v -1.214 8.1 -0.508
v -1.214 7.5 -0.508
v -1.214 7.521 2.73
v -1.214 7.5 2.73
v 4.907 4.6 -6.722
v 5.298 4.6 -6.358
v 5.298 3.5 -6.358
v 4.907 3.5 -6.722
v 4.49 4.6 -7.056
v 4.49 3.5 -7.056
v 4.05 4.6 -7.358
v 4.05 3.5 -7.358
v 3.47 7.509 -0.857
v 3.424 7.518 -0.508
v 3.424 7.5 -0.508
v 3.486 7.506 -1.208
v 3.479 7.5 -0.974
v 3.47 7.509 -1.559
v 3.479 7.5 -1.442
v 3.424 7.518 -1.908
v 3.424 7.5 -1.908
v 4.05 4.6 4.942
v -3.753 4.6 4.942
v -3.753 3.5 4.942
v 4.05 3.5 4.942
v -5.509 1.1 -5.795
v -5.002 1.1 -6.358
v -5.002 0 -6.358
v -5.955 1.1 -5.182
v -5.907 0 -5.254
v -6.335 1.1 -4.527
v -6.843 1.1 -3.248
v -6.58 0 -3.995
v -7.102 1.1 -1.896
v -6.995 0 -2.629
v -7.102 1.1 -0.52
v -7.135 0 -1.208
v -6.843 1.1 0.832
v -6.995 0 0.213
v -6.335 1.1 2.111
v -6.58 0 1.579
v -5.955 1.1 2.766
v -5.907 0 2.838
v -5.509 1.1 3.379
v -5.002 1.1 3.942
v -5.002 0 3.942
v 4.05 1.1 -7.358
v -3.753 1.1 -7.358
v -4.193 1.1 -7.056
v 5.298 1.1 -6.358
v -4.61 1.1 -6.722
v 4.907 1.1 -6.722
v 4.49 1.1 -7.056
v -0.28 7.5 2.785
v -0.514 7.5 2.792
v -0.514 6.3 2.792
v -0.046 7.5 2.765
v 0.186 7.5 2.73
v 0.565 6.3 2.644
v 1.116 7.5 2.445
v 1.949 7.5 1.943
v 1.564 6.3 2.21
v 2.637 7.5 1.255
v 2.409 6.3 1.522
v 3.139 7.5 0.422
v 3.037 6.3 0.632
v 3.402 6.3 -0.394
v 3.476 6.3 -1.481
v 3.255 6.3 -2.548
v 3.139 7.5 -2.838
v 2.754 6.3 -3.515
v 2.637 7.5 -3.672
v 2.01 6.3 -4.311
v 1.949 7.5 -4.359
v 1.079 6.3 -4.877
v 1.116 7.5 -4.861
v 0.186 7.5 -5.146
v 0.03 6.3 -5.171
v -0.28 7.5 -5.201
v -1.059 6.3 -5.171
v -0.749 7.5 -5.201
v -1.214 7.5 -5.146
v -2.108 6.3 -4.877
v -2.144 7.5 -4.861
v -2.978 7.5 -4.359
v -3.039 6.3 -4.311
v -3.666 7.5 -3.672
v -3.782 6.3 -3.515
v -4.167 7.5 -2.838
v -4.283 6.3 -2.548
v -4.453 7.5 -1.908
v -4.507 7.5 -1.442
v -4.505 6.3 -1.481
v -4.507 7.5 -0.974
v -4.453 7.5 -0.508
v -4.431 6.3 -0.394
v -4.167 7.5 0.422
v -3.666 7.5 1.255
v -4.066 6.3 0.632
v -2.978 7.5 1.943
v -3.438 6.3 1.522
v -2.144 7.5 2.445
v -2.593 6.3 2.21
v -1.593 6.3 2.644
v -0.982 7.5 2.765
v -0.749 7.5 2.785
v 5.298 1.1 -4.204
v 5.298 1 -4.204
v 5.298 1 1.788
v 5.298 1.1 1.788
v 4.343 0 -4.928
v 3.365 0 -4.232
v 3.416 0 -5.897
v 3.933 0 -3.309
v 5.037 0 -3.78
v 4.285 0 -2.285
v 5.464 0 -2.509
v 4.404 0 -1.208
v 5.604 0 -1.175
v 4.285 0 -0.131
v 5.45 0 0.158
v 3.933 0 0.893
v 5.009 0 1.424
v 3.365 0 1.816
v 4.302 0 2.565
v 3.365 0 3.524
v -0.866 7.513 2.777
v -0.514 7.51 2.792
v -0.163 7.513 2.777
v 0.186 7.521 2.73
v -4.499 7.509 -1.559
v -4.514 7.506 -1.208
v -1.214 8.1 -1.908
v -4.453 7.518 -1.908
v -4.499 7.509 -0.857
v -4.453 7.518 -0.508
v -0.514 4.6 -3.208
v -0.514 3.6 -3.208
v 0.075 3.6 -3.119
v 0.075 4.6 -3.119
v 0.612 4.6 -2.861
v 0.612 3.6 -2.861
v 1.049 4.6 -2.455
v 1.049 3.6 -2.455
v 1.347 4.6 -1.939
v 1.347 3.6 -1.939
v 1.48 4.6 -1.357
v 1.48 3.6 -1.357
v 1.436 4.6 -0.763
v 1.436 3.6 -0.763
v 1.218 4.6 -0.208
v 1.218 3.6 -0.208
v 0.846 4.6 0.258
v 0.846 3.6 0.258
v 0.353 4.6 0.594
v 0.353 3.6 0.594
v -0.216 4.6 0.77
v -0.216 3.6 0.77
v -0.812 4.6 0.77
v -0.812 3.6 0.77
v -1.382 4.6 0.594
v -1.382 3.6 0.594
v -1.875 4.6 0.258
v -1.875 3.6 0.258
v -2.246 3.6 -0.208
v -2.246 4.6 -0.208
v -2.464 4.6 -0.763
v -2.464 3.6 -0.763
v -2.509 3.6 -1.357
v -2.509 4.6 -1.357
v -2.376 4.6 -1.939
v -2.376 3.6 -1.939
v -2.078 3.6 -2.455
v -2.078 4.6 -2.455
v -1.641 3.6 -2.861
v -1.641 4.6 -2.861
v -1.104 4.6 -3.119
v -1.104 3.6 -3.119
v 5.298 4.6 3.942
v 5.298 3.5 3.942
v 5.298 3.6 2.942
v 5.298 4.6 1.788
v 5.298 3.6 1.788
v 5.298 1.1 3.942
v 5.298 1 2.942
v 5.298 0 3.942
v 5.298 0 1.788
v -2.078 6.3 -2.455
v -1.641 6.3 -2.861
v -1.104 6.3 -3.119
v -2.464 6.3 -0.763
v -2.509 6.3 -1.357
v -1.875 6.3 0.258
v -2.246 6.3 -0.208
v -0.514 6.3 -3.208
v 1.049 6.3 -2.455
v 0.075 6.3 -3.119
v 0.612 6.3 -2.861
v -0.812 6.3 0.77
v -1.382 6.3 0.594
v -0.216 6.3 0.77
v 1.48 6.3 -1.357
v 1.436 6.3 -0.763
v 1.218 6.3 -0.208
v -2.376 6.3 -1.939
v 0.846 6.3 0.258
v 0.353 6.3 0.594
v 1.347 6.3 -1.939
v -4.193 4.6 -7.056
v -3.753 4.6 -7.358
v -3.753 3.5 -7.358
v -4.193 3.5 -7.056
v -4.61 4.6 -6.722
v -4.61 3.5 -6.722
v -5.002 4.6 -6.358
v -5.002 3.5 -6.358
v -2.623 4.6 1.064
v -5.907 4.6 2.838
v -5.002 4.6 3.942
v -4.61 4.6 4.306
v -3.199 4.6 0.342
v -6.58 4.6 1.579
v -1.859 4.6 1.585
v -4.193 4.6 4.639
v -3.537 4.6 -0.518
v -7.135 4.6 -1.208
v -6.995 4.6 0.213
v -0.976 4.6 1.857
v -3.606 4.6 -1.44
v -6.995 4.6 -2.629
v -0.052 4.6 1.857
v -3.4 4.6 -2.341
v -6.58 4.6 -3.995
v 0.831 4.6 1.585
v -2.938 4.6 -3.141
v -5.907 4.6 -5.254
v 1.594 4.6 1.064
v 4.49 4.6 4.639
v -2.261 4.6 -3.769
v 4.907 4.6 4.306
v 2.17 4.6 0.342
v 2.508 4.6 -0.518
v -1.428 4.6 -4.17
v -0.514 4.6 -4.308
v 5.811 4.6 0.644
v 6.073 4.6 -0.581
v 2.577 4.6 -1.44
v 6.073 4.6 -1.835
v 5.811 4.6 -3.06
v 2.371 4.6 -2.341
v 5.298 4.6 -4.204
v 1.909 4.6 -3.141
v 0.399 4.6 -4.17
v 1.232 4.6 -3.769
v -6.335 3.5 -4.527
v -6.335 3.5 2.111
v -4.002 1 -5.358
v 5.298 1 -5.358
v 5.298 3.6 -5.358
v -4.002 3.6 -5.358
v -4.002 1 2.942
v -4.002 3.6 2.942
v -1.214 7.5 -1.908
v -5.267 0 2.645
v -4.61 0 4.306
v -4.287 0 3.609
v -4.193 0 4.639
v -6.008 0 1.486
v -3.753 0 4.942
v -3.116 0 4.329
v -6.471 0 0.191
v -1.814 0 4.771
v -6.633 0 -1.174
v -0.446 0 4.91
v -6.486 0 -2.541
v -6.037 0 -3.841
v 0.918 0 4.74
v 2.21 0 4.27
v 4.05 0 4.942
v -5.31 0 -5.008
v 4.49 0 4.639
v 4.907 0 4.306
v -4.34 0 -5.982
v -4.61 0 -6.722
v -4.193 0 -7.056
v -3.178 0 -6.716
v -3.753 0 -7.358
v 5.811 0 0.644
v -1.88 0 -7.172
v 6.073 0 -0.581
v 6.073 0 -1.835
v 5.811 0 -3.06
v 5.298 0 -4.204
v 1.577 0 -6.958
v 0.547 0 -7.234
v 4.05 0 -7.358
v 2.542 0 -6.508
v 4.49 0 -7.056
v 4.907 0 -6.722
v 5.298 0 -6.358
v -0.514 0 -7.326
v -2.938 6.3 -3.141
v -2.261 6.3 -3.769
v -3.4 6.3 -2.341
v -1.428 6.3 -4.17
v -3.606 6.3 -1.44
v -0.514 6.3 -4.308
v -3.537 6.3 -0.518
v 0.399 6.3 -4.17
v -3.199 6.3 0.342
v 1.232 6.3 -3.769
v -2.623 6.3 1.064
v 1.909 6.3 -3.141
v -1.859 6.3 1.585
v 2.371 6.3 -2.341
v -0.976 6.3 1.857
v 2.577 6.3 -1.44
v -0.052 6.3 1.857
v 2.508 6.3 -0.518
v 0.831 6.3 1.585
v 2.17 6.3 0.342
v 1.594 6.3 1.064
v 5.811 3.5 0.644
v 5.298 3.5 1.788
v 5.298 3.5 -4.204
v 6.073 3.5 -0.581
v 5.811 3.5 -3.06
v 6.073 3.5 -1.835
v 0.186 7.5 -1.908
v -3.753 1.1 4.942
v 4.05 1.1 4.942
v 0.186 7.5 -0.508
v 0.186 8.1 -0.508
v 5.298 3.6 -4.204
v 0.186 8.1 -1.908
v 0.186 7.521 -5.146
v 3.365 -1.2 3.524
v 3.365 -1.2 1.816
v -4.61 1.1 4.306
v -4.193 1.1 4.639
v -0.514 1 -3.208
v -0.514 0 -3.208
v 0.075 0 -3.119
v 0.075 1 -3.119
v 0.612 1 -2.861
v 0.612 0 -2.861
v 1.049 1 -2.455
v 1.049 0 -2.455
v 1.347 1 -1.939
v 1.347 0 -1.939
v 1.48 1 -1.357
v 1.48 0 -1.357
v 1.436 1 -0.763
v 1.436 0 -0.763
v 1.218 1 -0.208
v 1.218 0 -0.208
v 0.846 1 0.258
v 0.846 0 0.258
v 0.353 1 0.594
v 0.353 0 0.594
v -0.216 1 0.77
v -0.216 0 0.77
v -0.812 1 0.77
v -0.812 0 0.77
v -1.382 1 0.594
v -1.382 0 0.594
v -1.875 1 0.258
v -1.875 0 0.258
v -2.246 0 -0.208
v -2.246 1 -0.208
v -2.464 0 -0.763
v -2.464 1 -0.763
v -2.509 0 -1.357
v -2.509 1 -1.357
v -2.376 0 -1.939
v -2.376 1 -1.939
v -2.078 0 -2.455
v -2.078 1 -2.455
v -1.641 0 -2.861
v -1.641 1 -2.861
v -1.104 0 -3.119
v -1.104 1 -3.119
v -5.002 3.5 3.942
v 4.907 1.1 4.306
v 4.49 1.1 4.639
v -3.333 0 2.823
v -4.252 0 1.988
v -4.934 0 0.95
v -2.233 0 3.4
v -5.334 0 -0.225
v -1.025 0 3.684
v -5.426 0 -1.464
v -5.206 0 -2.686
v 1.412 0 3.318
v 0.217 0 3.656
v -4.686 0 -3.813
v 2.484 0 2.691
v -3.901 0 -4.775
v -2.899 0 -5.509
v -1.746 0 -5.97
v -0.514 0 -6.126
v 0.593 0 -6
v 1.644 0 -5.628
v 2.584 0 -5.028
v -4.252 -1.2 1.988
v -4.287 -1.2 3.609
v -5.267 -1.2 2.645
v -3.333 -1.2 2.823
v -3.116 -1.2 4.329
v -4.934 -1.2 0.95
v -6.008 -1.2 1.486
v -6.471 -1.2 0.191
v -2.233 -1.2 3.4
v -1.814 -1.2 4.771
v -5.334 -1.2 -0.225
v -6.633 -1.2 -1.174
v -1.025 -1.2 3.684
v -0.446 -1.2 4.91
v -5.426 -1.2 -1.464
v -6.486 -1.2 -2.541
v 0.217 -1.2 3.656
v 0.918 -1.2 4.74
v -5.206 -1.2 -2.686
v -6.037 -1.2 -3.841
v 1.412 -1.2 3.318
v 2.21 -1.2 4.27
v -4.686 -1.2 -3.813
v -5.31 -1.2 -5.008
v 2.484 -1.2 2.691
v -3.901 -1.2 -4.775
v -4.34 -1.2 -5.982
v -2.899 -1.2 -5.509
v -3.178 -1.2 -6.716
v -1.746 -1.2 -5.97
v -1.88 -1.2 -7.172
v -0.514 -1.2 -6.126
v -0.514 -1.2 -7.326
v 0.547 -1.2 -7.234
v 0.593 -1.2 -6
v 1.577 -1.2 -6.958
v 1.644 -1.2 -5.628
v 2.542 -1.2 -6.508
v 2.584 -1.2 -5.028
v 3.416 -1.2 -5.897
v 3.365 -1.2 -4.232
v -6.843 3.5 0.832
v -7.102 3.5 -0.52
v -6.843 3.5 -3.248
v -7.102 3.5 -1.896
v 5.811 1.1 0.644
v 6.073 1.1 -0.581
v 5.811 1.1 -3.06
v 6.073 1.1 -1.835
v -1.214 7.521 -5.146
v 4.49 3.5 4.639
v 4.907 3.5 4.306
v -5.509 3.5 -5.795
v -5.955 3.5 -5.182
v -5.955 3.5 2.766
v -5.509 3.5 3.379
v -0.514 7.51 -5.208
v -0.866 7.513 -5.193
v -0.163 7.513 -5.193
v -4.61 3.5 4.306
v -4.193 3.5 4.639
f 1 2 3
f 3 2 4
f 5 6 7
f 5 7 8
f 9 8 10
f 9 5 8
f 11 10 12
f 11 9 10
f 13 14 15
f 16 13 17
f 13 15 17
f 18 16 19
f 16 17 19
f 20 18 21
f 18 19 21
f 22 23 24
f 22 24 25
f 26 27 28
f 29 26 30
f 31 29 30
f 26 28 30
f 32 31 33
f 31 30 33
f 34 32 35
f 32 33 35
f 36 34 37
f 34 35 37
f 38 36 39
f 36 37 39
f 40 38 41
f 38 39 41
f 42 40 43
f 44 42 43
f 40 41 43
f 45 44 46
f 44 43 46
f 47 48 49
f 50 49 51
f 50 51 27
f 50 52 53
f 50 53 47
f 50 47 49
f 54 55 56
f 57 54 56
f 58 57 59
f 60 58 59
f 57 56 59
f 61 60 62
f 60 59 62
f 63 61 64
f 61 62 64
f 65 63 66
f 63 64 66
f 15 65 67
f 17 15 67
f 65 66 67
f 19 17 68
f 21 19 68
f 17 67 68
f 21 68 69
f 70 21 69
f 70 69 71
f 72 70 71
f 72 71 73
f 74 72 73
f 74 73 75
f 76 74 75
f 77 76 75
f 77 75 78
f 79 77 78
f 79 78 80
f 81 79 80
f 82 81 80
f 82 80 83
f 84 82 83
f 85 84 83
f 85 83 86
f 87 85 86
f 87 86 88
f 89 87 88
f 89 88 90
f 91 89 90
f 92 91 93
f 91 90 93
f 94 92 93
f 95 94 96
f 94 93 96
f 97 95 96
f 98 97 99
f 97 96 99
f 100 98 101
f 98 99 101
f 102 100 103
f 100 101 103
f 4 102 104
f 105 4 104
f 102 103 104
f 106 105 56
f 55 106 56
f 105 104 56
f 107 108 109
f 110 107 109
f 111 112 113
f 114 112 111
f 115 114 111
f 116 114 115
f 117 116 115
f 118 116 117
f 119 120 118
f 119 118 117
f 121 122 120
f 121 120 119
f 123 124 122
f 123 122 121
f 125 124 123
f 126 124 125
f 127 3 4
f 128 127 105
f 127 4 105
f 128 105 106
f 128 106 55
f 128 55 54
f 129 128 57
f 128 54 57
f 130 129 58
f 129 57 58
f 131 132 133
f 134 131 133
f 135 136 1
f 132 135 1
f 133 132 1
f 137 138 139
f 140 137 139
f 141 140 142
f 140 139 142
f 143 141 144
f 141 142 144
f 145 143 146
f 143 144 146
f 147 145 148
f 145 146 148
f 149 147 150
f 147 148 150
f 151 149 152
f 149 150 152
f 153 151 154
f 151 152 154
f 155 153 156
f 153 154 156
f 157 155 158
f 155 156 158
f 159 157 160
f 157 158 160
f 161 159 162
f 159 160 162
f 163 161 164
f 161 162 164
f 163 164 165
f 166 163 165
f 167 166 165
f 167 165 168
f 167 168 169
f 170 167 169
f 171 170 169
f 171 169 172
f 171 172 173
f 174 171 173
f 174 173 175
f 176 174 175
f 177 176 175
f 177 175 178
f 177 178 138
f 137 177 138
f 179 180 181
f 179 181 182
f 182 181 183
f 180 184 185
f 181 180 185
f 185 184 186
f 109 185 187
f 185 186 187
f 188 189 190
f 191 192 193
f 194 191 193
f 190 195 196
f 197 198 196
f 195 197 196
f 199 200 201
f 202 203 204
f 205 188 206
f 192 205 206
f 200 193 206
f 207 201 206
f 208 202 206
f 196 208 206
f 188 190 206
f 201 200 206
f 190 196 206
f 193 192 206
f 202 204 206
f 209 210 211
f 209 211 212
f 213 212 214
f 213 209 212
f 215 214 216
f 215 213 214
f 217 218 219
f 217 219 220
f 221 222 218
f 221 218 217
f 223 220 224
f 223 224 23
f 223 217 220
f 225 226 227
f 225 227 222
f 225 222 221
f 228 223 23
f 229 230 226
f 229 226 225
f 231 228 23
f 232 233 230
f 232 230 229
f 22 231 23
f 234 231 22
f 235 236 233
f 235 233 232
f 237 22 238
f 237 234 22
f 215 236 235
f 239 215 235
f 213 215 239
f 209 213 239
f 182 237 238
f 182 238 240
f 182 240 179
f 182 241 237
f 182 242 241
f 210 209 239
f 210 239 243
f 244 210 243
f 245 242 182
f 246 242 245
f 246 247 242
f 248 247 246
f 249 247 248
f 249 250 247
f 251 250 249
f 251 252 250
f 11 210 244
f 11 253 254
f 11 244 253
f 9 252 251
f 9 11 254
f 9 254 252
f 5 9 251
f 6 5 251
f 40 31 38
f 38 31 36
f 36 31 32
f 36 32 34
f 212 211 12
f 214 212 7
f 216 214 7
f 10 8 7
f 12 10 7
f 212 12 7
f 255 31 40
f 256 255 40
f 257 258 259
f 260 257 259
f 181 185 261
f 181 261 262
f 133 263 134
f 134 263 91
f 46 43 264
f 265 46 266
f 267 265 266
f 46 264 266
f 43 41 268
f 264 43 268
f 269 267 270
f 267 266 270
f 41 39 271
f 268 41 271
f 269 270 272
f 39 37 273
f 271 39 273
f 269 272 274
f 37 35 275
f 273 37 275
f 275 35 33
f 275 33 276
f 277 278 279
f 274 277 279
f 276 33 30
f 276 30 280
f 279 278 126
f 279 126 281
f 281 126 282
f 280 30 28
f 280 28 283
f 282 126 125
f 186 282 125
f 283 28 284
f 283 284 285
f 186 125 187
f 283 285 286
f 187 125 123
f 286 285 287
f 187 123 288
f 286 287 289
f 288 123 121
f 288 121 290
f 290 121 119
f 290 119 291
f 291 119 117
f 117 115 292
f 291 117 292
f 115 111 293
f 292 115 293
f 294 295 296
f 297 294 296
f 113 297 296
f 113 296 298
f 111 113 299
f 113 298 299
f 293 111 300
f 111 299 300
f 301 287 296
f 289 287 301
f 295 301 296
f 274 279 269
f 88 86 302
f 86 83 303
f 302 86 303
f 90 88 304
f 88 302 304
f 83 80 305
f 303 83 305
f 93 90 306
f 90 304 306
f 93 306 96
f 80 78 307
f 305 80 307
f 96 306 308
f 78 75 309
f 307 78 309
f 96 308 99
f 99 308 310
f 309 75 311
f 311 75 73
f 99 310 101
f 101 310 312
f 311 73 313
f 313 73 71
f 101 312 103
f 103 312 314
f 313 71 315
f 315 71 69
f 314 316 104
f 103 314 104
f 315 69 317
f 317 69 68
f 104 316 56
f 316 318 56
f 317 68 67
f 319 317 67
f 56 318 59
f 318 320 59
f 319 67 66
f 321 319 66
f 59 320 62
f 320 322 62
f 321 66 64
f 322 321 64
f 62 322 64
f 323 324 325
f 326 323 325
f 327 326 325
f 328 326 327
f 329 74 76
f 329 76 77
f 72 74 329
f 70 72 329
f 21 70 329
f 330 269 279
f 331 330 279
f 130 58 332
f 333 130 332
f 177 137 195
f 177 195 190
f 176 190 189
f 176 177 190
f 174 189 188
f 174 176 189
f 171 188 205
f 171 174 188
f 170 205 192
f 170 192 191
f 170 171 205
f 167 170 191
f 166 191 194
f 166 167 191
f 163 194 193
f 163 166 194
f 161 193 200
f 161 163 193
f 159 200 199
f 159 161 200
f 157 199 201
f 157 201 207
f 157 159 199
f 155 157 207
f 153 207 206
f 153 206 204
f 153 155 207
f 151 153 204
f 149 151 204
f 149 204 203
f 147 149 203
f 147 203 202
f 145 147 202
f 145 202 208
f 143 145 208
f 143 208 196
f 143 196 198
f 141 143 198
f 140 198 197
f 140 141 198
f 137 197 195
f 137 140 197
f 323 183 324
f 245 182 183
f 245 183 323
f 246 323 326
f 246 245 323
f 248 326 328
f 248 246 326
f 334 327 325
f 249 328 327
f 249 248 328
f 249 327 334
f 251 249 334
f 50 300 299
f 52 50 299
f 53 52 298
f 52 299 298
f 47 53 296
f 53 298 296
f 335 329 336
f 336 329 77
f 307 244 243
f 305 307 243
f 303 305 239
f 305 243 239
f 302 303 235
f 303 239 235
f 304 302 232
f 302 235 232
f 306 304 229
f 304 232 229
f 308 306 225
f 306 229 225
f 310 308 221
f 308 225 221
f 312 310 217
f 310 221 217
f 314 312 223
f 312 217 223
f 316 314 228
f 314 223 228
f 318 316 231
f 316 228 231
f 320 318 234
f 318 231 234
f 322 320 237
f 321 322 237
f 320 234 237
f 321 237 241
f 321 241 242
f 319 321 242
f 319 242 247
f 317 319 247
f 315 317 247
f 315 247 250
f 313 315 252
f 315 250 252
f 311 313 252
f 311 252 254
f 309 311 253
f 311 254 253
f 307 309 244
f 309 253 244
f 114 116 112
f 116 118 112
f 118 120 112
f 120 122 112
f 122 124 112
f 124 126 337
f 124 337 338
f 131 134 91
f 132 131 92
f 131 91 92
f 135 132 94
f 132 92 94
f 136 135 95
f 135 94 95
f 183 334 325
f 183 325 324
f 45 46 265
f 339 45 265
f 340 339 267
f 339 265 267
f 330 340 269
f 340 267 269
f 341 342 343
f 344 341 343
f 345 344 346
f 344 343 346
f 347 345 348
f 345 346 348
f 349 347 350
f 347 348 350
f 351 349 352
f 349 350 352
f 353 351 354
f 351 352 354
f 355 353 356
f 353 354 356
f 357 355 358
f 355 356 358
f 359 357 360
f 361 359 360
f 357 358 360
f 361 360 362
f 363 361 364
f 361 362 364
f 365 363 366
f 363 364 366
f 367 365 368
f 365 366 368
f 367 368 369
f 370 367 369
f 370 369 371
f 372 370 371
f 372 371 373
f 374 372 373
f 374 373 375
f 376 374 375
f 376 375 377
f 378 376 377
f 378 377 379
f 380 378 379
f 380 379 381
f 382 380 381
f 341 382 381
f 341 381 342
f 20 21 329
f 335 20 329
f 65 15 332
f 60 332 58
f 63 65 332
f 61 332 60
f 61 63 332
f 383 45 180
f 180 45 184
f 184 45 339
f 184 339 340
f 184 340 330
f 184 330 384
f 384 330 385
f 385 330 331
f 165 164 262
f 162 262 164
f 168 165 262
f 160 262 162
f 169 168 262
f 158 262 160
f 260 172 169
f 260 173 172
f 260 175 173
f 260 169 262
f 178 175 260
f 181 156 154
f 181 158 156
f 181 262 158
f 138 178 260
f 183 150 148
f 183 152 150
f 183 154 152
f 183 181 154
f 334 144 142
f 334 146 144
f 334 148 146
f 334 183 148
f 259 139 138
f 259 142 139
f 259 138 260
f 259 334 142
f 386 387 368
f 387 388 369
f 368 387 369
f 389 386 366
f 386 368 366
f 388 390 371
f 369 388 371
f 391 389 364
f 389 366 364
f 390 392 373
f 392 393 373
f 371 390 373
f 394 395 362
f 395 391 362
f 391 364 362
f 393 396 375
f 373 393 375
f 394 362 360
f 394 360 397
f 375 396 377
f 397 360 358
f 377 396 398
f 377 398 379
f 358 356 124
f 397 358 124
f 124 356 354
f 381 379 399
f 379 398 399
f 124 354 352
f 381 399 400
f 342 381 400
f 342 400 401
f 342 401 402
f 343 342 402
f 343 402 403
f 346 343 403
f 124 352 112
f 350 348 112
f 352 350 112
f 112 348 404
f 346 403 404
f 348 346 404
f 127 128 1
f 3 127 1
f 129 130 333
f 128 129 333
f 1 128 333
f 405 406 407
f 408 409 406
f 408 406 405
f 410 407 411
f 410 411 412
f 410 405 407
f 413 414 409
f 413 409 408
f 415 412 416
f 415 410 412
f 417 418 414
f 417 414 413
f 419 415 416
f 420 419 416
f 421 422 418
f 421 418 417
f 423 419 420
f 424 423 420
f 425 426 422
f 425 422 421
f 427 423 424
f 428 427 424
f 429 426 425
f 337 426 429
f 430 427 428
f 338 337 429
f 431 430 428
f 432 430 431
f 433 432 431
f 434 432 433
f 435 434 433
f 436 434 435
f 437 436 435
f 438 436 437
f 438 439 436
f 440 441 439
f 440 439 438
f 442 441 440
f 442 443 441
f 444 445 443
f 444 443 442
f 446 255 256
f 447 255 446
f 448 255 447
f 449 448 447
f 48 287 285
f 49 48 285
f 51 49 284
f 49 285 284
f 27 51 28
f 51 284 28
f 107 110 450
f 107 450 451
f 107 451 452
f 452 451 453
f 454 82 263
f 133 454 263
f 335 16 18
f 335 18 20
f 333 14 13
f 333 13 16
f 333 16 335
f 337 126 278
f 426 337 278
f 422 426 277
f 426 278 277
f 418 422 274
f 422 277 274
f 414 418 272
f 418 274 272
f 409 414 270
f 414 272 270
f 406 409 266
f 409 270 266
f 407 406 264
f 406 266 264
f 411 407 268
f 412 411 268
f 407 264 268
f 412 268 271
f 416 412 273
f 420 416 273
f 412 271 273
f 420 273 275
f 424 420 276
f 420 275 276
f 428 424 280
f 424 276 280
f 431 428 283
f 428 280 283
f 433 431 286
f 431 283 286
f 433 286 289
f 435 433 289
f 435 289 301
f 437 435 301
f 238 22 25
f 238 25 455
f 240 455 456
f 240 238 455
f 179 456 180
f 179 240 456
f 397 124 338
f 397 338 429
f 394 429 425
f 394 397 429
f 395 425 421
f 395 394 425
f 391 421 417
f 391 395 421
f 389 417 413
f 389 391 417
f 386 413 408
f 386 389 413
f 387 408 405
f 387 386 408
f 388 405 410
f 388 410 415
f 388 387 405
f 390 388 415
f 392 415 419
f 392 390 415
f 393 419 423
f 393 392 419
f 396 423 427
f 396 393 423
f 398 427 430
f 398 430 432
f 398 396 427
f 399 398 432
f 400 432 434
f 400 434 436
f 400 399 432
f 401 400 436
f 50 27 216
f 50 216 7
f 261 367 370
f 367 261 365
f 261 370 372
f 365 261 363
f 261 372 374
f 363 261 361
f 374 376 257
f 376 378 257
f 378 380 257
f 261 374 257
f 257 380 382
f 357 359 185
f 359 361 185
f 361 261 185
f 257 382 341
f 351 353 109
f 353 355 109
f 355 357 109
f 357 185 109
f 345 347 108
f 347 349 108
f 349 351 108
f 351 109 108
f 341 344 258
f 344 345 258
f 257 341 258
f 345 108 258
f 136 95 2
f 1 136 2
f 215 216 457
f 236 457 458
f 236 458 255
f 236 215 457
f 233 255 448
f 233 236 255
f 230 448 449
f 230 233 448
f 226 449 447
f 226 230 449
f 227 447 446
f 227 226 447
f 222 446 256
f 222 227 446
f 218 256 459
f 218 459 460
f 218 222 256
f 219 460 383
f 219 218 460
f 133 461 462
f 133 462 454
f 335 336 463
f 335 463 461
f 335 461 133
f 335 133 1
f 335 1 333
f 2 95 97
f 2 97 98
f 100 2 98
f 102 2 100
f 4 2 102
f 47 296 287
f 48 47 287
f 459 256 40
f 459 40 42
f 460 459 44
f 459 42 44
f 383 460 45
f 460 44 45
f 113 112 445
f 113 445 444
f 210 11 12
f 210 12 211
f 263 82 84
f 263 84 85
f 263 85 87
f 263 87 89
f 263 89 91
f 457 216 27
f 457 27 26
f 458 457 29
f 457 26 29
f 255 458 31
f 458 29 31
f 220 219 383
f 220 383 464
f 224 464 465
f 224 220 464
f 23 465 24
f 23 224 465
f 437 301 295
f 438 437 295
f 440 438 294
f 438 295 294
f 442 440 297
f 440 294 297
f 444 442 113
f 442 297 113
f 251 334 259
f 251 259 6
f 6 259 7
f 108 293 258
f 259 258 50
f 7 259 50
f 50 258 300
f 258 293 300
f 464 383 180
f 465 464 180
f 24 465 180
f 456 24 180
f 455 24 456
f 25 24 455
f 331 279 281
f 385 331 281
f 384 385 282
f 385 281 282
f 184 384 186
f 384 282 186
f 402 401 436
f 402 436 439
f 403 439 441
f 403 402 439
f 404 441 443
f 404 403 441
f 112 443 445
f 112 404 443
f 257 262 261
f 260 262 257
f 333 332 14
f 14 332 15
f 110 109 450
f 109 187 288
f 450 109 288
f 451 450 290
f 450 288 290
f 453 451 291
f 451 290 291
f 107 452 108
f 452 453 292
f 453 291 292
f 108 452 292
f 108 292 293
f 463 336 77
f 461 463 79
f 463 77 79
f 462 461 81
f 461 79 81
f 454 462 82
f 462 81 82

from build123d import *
from build123d.topology import SkipClean

# Parameters (mm, degrees)
SKETCH5_W           = 10.3
SKETCH5_H           = 10.3
BOSS_EXTRUDE2_DEPTH = 4.6
SKETCH6_W           = 8.3
SKETCH6_H           = 2.6
CUT_EXTRUDE3_DEPTH  = 9.3
BOSS_EXTRUDE4_DEPTH = 1.1
BOSS_EXTRUDE5_REACH = 12.83
SKETCH10_R          = 2
CUT_EXTRUDE4_DEPTH  = 12.234169035
SKETCH11_R          = 3.1
SKETCH11_R_2        = 2
BOSS_EXTRUDE6_DEPTH = 1.7
SKETCH12_R          = 4
BOSS_EXTRUDE7_DEPTH = 1.2
BOSS_EXTRUDE8_DEPTH = 0.6
CUT_EXTRUDE7_DEPTH  = 14.165903481
CUT_EXTRUDE8_DEPTH  = 13.784307824
SKETCH16_R          = 6.11839758
SKETCH16_R_2        = 4.91839758
BOSS_EXTRUDE9_DEPTH = 1.2
CUT_EXTRUDE9_START  = -1.2
CUT_EXTRUDE9_DEPTH  = 1.2


with BuildPart() as part:
    # Sketch5 → Boss-Extrude2 (new body)
    with BuildSketch(Plane(origin=(0, 0, 0), x_dir=(1, 0, 0), z_dir=(0, 1, 0))):
        with Locations((0.148353909, 1.208024691)):
            Rectangle(SKETCH5_W, SKETCH5_H)
    extrude(amount=BOSS_EXTRUDE2_DEPTH)

    # Sketch6 → Cut-Extrude3 (cut)
    with BuildSketch(Plane(origin=(5.298353909, 0, 0), x_dir=(0, 0, -1), z_dir=(1, 0, 0))):
        with Locations((1.208024691, 2.3)):
            Rectangle(SKETCH6_W, SKETCH6_H)
    cut_extrude3 = extrude(amount=-CUT_EXTRUDE3_DEPTH, mode=Mode.SUBTRACT)

    # Sketch7 → Boss-Extrude4 (add)
    with BuildSketch(Plane(origin=(0, 4.6, 0), x_dir=(1, 0, 0), z_dir=(0, 1, 0))):
        with BuildLine():
            Line((4.049956144, 7.358024691), (-3.753248326, 7.358024691))
            ThreePointArc((-3.753248326, 7.358024691), (-4.404982862, 6.89240014), (-5.001646091, 6.358024691))
            Line((-5.001646091, 6.358024691), (5.298353909, 6.358024691))
            ThreePointArc((5.298353909, 6.358024691), (4.701690681, 6.89240014), (4.049956144, 7.358024691))
        make_face()
        with BuildLine():
            Line((-5.001646091, -3.941975309), (-5.001646091, 6.358024691))
            ThreePointArc((-5.001646091, 6.358024691), (-7.134845937, 1.208024691), (-5.001646091, -3.941975309))
        make_face()
        with BuildLine():
            Line((5.298353909, -3.941975309), (-5.001646091, -3.941975309))
            ThreePointArc((-5.001646091, -3.941975309), (-4.404982862, -4.476350758), (-3.753248326, -4.941975309))
            Line((-3.753248326, -4.941975309), (4.049956144, -4.941975309))
            ThreePointArc((4.049956144, -4.941975309), (4.701690681, -4.476350758), (5.298353909, -3.941975309))
        make_face()
        with BuildLine():
            ThreePointArc((5.298353909, -1.787660692), (6.106258819, 1.208024691), (5.298353909, 4.203710075))
            Line((5.298353909, 4.203710075), (5.298353909, -1.787660692))
        make_face()
    boss_extrude4 = extrude(amount=-BOSS_EXTRUDE4_DEPTH)

    # Mirror1: Cut-Extrude3, Boss-Extrude4 across plane
    add(cut_extrude3.mirror(Plane.ZX.offset(2.3)), mode=Mode.SUBTRACT)
    add(boss_extrude4.mirror(Plane.ZX.offset(2.3)))

    # Sketch8 → Boss-Extrude5 (add, up to next)
    with BuildSketch(Plane(origin=(0, 1.1, 0), x_dir=(1, 0, 0), z_dir=(0, 1, 0)), mode=Mode.PRIVATE) as boss_extrude5_sk1:
        with BuildLine():
            Line((-6.334845937, 4.52662677), (-6.334845937, -2.110577387))
            ThreePointArc((-6.334845937, -2.110577387), (-5.739883454, -3.078426142), (-5.001646091, -3.941975309))
            Line((-5.001646091, -3.941975309), (-5.001646091, 6.358024691))
            ThreePointArc((-5.001646091, 6.358024691), (-5.739883454, 5.494475525), (-6.334845937, 4.52662677))
        make_face()
    boss_extrude5_tool1 = extrude(boss_extrude5_sk1.sketch, amount=BOSS_EXTRUDE5_REACH, mode=Mode.PRIVATE) - part.part
    add(boss_extrude5_tool1.solids().sort_by_distance((-5.621972, 1.1, -1.208025))[0])

    # Sketch10 → Cut-Extrude4 (cut, through all)
    with SkipClean():  # the faces are left unmerged after this step: merging them gives an invalid solid
        with BuildSketch(Plane.XZ):
            with Locations(Location((-0.514293559, -1.208024691, 0), (0, 0, 270))):
                Circle(SKETCH10_R)
        extrude(amount=-CUT_EXTRUDE4_DEPTH, mode=Mode.SUBTRACT)

    # Sketch11 → Boss-Extrude6 (add)
    with SkipClean():  # the faces are left unmerged after this step: merging them gives an invalid solid
        with BuildSketch(Plane(origin=(0, 4.6, 0), x_dir=(1, 0, 0), z_dir=(0, 1, 0))):
            with Locations(Location((-0.514293559, 1.208024691, 0), (0, 0, 90))):
                Circle(SKETCH11_R)
            with Locations(Location((-0.514293559, 1.208024691, 0), (0, 0, 90))):
                Circle(SKETCH11_R_2, mode=Mode.SUBTRACT)
        extrude(amount=BOSS_EXTRUDE6_DEPTH)

    # Sketch12 → Boss-Extrude7 (add)
    with SkipClean():  # the faces are left unmerged after this step: merging them gives an invalid solid
        with BuildSketch(Plane(origin=(0, 6.3, 0), x_dir=(1, 0, 0), z_dir=(0, 1, 0))):
            with Locations(Location((-0.514293559, 1.208024691, 0), (0, 0, 270))):
                Circle(SKETCH12_R)
        extrude(amount=BOSS_EXTRUDE7_DEPTH)

    # Sketch13 → Boss-Extrude8 (add)
    with SkipClean():  # the faces are left unmerged after this step: merging them gives an invalid solid
        with BuildSketch(Plane(origin=(0, 7.5, 0), x_dir=(1, 0, 0), z_dir=(0, 1, 0))):
            with BuildLine():
                Line((-1.214293559, 5.146298425), (-1.214293559, 1.908024691))
                Line((-1.214293559, 1.908024691), (-4.452567292, 1.908024691))
                ThreePointArc((-4.452567292, 1.908024691), (-4.514293559, 1.208024691), (-4.452567292, 0.508024691))
                Line((-4.452567292, 0.508024691), (-1.214293559, 0.508024691))
                Line((-1.214293559, 0.508024691), (-1.214293559, -2.730249042))
                ThreePointArc((-1.214293559, -2.730249042), (-0.514293559, -2.791975309), (0.185706441, -2.730249042))
                Line((0.185706441, -2.730249042), (0.185706441, 0.508024691))
                Line((0.185706441, 0.508024691), (3.423980175, 0.508024691))
                ThreePointArc((3.423980175, 0.508024691), (3.485706441, 1.208024691), (3.423980175, 1.908024691))
                Line((3.423980175, 1.908024691), (0.185706441, 1.908024691))
                Line((0.185706441, 1.908024691), (0.185706441, 5.146298425))
                ThreePointArc((0.185706441, 5.146298425), (-0.514293559, 5.208024691), (-1.214293559, 5.146298425))
            make_face()
        extrude(amount=BOSS_EXTRUDE8_DEPTH)

    # Sketch14 → Cut-Extrude7 (cut, through all)
    with SkipClean():  # the faces are left unmerged after this step: merging them gives an invalid solid
        with BuildSketch(Plane(origin=(0.185706441, 0, 0), x_dir=(0, 0, -1), z_dir=(1, 0, 0))):
            Polygon((-2.8486475, 7.5), (0.508024691, 8.1), (-2.8486475, 8.1), align=None)
            Polygon((5.264696882, 7.5), (1.908024691, 8.1), (5.264696882, 8.1), align=None)
        extrude(amount=-CUT_EXTRUDE7_DEPTH, mode=Mode.SUBTRACT)

    # Sketch15 → Cut-Extrude8 (cut, through all)
    with SkipClean():  # the faces are left unmerged after this step: merging them gives an invalid solid
        with BuildSketch(Plane.XY.offset(-0.508024691)):
            Polygon((3.521468612, 8.1), (3.521468612, 7.5), (0.185706441, 8.1), align=None)
            Polygon((-4.550055729, 7.5), (-1.214293559, 8.1), (-4.550055729, 8.1), align=None)
        extrude(amount=-CUT_EXTRUDE8_DEPTH, mode=Mode.SUBTRACT)

    # Sketch16 → Boss-Extrude9 (add)
    with SkipClean():  # the faces are left unmerged after this step: merging them gives an invalid solid
        with BuildSketch(Plane.XZ):
            with Locations(Location((-0.514293559, -1.208024691, 0), (0, 0, 270))):
                Circle(SKETCH16_R)
            with Locations(Location((-0.514293559, -1.208024691, 0), (0, 0, 270))):
                Circle(SKETCH16_R_2, mode=Mode.SUBTRACT)
        extrude(amount=BOSS_EXTRUDE9_DEPTH)

    # Sketch17 → Cut-Extrude9 (cut)
    with SkipClean():  # the faces are left unmerged after this step: merging them gives an invalid solid
        with BuildSketch(Plane.XZ.offset(1.2).offset(CUT_EXTRUDE9_START)):
            with BuildLine():
                Line((3.364577542, 1.816044378), (3.364577542, -4.232093761))
                Line((3.364577542, -4.232093761), (3.415683395, -5.897381799))
                ThreePointArc((3.415683395, -5.897381799), (5.604014001, -1.174835129), (3.364577542, 3.523692537))
                Line((3.364577542, 3.523692537), (3.364577542, 1.816044378))
            make_face()
        extrude(amount=CUT_EXTRUDE9_DEPTH, mode=Mode.SUBTRACT)


solid = part.part
